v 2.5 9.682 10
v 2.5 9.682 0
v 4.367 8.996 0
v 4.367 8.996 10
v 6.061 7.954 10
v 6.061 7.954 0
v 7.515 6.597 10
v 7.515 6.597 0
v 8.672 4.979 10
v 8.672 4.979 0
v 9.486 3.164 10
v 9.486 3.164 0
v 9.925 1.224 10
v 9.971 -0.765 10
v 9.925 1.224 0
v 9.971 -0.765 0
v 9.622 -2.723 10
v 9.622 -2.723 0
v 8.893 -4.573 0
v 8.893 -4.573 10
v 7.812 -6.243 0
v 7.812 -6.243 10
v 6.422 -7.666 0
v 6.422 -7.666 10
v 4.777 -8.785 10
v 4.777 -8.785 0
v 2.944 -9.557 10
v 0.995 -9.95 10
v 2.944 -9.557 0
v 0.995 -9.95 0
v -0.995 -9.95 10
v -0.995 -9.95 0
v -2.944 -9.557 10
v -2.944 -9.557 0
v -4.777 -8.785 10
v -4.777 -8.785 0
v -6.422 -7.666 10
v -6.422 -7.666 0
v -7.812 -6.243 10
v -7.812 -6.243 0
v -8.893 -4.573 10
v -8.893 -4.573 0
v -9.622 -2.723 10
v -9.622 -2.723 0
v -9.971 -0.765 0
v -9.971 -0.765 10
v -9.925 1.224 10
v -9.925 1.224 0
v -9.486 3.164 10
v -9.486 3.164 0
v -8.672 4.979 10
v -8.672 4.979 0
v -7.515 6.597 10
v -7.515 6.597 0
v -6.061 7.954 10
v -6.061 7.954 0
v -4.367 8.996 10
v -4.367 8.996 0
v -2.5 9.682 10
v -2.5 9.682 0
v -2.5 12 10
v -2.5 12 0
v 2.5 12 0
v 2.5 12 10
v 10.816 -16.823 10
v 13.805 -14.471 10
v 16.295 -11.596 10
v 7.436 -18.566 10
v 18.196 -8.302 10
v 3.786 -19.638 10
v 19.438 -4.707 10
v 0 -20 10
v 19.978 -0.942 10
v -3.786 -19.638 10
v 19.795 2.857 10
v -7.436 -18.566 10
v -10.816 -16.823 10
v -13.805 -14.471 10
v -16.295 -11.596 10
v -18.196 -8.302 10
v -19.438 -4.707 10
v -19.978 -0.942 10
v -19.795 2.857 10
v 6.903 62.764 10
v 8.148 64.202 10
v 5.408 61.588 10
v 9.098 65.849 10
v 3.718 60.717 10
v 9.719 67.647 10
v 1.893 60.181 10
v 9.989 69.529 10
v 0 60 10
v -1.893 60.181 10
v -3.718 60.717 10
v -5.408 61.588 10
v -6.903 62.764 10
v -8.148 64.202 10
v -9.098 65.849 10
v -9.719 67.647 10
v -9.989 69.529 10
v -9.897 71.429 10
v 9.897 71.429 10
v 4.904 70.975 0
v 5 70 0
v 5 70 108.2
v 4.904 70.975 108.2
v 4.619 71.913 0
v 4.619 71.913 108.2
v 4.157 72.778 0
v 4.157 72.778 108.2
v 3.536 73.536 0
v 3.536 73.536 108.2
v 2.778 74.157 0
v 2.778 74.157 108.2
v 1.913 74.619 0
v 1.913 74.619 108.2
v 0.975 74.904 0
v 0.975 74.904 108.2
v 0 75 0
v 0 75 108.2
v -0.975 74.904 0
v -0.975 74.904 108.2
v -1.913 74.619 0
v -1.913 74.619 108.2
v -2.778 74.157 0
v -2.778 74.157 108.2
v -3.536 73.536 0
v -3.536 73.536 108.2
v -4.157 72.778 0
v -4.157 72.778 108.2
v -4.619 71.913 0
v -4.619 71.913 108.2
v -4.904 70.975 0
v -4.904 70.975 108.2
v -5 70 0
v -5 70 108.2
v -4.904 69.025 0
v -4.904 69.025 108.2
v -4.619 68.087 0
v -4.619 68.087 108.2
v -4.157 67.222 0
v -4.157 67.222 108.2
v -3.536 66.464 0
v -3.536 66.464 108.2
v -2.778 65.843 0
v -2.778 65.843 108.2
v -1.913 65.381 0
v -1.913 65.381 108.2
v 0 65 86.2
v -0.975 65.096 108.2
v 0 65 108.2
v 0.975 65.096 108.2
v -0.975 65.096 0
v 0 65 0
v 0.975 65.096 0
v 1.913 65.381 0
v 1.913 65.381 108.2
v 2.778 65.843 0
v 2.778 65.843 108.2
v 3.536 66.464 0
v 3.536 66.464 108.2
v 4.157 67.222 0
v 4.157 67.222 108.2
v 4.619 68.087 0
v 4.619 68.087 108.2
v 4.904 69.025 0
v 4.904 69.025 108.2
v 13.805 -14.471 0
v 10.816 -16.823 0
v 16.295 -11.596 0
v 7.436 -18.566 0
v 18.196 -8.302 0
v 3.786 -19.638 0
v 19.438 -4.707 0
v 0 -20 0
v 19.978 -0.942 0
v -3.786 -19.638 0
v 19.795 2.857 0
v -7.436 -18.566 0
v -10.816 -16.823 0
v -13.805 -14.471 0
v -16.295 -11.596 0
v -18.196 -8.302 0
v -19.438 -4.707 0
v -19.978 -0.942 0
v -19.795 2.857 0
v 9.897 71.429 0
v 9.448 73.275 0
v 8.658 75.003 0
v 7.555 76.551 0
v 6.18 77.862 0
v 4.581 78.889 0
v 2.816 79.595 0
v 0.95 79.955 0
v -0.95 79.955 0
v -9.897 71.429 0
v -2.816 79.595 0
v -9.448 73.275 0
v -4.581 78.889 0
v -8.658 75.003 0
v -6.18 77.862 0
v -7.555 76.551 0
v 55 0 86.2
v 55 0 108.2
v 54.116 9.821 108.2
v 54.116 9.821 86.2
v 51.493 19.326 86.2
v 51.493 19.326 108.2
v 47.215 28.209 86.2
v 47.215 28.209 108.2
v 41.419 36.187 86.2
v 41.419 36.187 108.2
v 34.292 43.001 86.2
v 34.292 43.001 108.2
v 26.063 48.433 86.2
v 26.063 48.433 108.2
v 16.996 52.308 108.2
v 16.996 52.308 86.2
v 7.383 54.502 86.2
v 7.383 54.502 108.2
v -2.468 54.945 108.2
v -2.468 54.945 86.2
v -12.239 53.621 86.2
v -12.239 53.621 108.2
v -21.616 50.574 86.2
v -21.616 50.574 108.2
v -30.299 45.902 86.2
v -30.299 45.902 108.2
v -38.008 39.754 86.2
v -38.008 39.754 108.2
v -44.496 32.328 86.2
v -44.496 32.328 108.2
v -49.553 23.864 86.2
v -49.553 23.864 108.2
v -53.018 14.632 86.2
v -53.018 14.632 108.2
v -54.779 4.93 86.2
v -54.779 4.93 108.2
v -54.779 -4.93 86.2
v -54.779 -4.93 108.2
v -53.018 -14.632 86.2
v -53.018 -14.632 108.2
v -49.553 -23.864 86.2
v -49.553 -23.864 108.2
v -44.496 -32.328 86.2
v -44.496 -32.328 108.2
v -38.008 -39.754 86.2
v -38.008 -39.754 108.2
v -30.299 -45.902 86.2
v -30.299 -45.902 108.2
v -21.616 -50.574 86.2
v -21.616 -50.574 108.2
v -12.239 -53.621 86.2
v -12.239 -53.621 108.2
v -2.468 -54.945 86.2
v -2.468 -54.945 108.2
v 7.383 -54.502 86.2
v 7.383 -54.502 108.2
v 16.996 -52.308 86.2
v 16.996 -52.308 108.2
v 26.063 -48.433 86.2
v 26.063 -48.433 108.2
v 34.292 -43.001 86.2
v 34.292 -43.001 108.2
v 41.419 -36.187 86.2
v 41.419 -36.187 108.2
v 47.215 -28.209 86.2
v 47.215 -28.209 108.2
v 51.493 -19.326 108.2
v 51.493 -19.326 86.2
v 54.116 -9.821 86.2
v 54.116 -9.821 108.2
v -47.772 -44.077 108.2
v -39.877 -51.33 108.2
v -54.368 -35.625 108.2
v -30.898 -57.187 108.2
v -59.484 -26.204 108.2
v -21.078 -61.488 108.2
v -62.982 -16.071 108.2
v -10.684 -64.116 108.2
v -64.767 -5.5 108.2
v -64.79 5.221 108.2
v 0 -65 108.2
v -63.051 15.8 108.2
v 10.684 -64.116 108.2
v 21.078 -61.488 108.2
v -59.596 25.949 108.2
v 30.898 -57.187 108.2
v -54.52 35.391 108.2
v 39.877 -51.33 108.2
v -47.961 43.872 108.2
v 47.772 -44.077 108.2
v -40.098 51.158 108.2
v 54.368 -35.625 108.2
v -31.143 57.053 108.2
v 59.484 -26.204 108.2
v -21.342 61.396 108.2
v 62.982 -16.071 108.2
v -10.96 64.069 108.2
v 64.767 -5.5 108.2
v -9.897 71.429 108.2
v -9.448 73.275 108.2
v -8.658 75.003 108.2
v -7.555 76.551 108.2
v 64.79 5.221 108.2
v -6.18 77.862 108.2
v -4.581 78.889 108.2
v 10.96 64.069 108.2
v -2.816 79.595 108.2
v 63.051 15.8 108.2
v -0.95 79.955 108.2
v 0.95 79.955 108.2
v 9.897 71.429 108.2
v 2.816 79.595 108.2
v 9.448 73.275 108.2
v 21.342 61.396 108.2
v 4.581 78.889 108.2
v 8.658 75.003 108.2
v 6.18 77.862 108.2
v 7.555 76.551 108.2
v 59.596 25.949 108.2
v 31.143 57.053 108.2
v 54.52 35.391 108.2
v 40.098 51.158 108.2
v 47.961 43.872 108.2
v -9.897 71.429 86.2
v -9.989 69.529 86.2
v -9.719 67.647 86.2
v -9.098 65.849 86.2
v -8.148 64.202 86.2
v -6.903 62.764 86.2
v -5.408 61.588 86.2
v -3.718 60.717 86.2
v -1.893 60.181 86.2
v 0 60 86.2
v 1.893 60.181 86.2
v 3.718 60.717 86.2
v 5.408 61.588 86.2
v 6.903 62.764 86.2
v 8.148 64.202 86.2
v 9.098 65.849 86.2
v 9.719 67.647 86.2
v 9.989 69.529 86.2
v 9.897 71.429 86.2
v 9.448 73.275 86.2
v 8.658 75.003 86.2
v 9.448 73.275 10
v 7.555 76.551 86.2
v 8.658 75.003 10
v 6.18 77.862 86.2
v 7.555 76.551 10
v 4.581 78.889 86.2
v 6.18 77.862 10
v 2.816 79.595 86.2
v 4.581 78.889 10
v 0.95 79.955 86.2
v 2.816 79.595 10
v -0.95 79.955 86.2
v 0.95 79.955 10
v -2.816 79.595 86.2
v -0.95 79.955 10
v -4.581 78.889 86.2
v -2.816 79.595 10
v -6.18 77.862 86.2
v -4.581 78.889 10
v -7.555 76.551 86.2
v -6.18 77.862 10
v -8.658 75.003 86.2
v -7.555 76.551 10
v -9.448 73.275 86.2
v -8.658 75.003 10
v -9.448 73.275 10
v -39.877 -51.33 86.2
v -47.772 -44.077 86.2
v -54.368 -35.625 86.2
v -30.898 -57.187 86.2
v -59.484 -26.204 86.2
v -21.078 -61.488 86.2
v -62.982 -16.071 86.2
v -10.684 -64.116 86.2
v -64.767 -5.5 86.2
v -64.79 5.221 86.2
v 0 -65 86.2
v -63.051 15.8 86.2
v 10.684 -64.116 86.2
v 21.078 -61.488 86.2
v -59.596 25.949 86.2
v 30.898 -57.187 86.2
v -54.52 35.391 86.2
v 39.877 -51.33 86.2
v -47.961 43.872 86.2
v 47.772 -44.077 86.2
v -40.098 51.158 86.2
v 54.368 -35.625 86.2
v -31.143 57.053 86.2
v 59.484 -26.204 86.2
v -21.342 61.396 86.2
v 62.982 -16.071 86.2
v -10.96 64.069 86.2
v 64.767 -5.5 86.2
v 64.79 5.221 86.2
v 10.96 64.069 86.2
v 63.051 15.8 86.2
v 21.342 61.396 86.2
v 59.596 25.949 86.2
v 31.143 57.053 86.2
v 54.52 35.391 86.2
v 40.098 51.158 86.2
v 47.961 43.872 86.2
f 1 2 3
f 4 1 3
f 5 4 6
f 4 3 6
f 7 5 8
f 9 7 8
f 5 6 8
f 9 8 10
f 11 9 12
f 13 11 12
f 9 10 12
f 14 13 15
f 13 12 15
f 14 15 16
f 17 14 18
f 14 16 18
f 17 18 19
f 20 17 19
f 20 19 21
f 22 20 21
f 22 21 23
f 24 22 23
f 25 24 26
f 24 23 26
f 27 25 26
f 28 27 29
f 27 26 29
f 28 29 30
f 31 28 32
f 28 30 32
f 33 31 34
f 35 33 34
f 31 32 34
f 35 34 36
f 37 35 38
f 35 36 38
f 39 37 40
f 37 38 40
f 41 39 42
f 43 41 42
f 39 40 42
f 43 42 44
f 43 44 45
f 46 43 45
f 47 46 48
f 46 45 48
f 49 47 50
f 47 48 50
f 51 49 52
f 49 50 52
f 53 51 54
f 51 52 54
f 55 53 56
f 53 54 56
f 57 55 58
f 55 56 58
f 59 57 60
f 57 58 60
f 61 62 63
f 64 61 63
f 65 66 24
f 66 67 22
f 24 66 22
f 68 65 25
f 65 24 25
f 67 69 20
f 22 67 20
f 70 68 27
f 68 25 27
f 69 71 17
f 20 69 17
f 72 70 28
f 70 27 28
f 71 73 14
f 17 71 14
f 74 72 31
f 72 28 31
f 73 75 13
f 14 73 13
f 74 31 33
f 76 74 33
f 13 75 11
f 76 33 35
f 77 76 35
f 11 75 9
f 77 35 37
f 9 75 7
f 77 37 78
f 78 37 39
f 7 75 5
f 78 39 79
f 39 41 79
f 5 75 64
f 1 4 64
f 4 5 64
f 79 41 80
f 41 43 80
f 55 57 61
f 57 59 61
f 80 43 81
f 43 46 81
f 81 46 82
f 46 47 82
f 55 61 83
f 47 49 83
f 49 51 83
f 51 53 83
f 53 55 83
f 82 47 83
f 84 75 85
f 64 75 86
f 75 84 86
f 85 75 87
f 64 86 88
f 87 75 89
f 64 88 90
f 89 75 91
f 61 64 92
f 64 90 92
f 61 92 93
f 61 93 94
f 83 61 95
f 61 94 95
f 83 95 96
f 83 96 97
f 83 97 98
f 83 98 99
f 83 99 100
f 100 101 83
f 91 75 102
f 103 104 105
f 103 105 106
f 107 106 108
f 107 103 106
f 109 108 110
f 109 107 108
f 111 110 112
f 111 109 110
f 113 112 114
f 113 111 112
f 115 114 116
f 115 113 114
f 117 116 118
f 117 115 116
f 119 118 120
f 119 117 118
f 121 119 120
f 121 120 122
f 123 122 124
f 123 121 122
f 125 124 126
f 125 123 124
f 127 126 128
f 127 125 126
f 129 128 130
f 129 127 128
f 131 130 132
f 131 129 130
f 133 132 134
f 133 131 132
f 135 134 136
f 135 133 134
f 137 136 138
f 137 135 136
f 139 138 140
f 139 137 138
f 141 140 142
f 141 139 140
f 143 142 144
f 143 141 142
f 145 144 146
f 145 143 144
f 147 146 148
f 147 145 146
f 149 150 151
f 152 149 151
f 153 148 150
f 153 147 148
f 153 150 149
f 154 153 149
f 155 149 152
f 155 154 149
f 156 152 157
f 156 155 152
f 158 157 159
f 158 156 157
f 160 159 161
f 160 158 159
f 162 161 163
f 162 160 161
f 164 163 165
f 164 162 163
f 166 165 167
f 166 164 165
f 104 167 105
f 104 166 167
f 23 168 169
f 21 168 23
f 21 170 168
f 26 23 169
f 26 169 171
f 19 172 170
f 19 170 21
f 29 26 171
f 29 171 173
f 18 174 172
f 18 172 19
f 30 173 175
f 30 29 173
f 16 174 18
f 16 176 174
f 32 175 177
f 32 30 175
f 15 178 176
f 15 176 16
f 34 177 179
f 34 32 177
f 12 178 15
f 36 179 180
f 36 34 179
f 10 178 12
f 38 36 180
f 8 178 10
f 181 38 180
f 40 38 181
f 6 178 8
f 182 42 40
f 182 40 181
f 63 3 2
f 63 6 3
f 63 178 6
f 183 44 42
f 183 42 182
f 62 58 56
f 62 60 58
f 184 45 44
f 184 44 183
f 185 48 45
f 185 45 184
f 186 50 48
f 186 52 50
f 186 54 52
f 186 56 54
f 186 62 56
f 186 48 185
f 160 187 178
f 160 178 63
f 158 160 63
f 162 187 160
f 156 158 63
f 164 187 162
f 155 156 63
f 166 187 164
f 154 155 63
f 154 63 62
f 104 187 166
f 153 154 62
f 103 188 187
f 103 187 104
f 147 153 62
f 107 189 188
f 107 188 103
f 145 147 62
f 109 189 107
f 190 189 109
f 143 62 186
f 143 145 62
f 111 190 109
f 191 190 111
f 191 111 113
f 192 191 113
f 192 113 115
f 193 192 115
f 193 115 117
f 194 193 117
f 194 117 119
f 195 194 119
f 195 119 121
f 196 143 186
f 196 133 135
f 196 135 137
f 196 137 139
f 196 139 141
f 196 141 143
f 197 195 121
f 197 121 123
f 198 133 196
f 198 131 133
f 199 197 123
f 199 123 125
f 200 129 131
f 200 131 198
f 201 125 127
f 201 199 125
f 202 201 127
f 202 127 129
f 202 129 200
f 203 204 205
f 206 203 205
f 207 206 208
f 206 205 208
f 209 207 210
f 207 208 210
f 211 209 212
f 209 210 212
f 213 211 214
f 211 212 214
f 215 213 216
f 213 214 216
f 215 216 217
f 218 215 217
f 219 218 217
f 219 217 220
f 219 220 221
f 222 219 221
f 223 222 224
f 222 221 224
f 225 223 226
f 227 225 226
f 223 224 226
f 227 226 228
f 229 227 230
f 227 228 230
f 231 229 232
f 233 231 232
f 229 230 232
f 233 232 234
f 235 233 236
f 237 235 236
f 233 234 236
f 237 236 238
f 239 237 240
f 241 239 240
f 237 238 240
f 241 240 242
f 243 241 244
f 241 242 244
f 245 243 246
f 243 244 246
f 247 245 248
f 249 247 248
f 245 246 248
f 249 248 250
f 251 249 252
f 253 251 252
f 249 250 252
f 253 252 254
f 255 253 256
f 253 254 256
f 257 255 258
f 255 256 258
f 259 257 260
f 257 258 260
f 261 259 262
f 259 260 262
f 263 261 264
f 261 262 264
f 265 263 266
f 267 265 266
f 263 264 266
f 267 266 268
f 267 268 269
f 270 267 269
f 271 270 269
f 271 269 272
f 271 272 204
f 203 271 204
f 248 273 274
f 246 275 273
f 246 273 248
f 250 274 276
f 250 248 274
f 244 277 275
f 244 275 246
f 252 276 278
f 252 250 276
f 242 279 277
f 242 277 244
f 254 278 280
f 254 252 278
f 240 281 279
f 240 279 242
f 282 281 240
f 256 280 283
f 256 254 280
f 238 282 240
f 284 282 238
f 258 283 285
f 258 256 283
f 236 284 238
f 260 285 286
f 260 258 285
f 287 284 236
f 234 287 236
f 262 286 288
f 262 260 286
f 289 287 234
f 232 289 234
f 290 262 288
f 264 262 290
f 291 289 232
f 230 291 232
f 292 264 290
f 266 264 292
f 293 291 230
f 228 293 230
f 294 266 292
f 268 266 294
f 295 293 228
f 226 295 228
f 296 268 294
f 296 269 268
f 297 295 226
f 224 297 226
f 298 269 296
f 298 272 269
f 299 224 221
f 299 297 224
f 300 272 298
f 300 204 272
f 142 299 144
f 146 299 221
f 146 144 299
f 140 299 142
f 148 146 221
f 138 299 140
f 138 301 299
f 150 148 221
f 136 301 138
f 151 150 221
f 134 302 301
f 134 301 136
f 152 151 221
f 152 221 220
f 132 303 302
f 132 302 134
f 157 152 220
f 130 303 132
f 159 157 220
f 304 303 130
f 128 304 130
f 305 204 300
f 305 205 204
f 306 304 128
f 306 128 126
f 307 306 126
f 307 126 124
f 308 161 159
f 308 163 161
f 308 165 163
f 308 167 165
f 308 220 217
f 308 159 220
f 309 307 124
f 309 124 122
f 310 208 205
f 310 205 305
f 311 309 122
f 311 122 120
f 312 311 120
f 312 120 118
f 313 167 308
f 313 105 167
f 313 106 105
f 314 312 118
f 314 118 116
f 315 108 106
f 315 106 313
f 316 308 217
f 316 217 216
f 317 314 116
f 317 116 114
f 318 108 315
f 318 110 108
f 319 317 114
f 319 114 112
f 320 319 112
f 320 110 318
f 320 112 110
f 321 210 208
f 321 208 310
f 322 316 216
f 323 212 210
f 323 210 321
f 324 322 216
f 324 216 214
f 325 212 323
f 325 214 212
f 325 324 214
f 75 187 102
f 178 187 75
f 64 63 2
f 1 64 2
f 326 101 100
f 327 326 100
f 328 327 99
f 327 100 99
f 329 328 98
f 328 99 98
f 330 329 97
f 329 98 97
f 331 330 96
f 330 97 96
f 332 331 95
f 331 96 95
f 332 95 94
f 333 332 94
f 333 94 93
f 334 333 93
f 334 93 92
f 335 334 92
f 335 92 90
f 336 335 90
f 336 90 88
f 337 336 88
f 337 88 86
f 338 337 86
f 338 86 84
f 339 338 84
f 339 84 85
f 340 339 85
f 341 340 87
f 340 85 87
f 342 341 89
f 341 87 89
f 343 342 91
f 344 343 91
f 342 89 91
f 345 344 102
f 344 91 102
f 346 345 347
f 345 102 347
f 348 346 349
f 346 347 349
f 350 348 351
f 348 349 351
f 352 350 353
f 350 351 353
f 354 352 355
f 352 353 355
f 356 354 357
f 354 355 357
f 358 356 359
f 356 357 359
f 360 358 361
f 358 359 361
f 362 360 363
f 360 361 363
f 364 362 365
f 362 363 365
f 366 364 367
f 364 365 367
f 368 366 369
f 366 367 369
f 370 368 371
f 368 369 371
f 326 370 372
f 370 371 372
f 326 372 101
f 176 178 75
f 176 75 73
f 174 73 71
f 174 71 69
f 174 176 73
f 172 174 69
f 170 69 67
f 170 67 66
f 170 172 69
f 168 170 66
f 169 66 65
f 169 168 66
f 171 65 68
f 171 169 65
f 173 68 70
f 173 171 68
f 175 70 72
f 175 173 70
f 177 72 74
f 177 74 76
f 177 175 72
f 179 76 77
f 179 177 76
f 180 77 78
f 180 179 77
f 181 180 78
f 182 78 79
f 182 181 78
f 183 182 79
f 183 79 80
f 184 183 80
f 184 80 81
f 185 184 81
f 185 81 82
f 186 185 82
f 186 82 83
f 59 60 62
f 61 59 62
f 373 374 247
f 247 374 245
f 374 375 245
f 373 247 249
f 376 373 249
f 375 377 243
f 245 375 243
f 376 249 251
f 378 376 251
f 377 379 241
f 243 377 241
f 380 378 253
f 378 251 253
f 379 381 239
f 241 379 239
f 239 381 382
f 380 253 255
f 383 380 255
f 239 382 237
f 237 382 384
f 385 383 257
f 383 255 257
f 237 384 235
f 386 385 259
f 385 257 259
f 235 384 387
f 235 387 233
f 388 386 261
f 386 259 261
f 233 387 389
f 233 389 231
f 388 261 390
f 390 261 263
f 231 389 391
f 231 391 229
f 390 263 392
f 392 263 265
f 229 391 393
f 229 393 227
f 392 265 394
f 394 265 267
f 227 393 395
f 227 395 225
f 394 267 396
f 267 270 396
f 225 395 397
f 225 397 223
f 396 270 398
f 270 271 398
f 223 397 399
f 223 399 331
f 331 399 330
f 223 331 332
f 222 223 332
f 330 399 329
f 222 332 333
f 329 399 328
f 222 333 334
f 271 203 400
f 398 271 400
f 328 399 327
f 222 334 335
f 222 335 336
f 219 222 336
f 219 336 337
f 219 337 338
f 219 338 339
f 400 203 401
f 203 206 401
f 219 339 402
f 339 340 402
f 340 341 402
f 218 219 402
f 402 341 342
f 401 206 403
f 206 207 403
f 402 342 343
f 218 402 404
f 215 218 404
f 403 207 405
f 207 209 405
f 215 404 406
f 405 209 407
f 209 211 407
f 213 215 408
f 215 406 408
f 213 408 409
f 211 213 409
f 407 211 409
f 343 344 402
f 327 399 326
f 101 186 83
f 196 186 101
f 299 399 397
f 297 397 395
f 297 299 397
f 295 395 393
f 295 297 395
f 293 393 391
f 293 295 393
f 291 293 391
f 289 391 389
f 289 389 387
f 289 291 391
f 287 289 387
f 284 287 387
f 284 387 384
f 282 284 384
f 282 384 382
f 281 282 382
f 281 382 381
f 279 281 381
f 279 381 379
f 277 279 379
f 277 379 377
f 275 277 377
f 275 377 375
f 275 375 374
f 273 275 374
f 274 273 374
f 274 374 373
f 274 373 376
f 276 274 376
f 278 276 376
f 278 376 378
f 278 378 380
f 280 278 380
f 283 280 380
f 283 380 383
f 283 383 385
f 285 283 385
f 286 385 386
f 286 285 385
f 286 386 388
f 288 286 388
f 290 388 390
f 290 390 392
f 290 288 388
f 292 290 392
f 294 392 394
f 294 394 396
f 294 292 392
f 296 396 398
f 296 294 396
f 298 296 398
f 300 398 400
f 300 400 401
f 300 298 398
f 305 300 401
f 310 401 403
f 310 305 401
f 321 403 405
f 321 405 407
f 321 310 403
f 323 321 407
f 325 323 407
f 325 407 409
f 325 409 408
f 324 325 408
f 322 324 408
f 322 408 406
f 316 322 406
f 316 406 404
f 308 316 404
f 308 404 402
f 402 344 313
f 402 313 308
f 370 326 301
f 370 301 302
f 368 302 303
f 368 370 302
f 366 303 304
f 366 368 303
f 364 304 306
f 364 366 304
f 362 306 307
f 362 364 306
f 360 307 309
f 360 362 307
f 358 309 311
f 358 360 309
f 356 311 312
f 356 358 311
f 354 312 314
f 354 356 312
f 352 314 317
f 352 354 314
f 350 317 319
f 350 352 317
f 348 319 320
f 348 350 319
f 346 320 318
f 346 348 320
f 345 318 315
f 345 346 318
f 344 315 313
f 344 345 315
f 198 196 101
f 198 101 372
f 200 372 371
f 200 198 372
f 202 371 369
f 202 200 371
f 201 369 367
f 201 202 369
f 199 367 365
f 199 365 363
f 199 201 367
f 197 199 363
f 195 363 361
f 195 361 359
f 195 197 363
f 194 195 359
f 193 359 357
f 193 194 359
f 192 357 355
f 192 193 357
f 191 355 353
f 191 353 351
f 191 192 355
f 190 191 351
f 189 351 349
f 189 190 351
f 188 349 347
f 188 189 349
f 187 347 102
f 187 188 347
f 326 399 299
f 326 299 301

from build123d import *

# Parameters (mm, degrees)
SKETCH2_R           = 5
BOSS_EXTRUDE1_DEPTH = 10
SKETCH3_R           = 10
SKETCH3_R_2         = 5
BOSS_EXTRUDE2_DEPTH = 76.2
BOSS_EXTRUDE3_START = 86.2
SKETCH2_2_R         = 5
BOSS_EXTRUDE3_DEPTH = 22
SKETCH5_R           = 65
BOSS_EXTRUDE4_DEPTH = 22
SKETCH6_R           = 55
CUT_EXTRUDE1_DEPTH  = 22


with BuildPart() as part:
    # Sketch2 → Boss-Extrude1 (new body)
    with BuildSketch(Plane.XY):
        with BuildLine():
            Line((-19.794866372, 2.857142857), (-9.897433186, 71.428571429))
            ThreePointArc((-9.897433186, 71.428571429), (0, 80), (9.897433186, 71.428571429))
            Line((9.897433186, 71.428571429), (19.794866372, 2.857142857))
            ThreePointArc((19.794866372, 2.857142857), (0, -20), (-19.794866372, 2.857142857))
        make_face()
        with Locations((0, 70)):
            Circle(SKETCH2_R, mode=Mode.SUBTRACT)
        with BuildLine():
            Line((-2.5, 9.682458366), (-2.5, 12))
            Line((-2.5, 12), (2.5, 12))
            Line((2.5, 12), (2.5, 9.682458366))
            ThreePointArc((2.5, 9.682458366), (0, -10), (-2.5, 9.682458366))
        make_face(mode=Mode.SUBTRACT)
    extrude(amount=BOSS_EXTRUDE1_DEPTH)

    # Sketch3 → Boss-Extrude2 (add)
    with BuildSketch(Plane.XY.offset(10)):
        with Locations(Location((0, 70, 0), (0, 0, 171.786789298))):
            Circle(SKETCH3_R)
        with Locations((0, 70)):
            Circle(SKETCH3_R_2, mode=Mode.SUBTRACT)
    extrude(amount=BOSS_EXTRUDE2_DEPTH)

    # Sketch2<2> → Boss-Extrude3 (add)
    with BuildSketch(Plane.XY.offset(BOSS_EXTRUDE3_START)):
        with BuildLine():
            Line((-19.794866372, 2.857142857), (-9.897433186, 71.428571429))
            ThreePointArc((-9.897433186, 71.428571429), (0, 80), (9.897433186, 71.428571429))
            Line((9.897433186, 71.428571429), (19.794866372, 2.857142857))
            ThreePointArc((19.794866372, 2.857142857), (0, -20), (-19.794866372, 2.857142857))
        make_face()
        with Locations((0, 70)):
            Circle(SKETCH2_2_R, mode=Mode.SUBTRACT)
        with BuildLine():
            Line((-2.5, 9.682458366), (-2.5, 12))
            Line((-2.5, 12), (2.5, 12))
            Line((2.5, 12), (2.5, 9.682458366))
            ThreePointArc((2.5, 9.682458366), (0, -10), (-2.5, 9.682458366))
        make_face(mode=Mode.SUBTRACT)
    extrude(amount=BOSS_EXTRUDE3_DEPTH)

    # Sketch5 → Boss-Extrude4 (add)
    with BuildSketch(Plane.XY.offset(108.2)):
        Circle(SKETCH5_R)
    extrude(amount=-BOSS_EXTRUDE4_DEPTH)

    # Sketch6 → Cut-Extrude1 (cut)
    with BuildSketch(Plane.XY.offset(108.2)):
        Circle(SKETCH6_R)
    extrude(amount=-CUT_EXTRUDE1_DEPTH, mode=Mode.SUBTRACT)


solid = part.part
